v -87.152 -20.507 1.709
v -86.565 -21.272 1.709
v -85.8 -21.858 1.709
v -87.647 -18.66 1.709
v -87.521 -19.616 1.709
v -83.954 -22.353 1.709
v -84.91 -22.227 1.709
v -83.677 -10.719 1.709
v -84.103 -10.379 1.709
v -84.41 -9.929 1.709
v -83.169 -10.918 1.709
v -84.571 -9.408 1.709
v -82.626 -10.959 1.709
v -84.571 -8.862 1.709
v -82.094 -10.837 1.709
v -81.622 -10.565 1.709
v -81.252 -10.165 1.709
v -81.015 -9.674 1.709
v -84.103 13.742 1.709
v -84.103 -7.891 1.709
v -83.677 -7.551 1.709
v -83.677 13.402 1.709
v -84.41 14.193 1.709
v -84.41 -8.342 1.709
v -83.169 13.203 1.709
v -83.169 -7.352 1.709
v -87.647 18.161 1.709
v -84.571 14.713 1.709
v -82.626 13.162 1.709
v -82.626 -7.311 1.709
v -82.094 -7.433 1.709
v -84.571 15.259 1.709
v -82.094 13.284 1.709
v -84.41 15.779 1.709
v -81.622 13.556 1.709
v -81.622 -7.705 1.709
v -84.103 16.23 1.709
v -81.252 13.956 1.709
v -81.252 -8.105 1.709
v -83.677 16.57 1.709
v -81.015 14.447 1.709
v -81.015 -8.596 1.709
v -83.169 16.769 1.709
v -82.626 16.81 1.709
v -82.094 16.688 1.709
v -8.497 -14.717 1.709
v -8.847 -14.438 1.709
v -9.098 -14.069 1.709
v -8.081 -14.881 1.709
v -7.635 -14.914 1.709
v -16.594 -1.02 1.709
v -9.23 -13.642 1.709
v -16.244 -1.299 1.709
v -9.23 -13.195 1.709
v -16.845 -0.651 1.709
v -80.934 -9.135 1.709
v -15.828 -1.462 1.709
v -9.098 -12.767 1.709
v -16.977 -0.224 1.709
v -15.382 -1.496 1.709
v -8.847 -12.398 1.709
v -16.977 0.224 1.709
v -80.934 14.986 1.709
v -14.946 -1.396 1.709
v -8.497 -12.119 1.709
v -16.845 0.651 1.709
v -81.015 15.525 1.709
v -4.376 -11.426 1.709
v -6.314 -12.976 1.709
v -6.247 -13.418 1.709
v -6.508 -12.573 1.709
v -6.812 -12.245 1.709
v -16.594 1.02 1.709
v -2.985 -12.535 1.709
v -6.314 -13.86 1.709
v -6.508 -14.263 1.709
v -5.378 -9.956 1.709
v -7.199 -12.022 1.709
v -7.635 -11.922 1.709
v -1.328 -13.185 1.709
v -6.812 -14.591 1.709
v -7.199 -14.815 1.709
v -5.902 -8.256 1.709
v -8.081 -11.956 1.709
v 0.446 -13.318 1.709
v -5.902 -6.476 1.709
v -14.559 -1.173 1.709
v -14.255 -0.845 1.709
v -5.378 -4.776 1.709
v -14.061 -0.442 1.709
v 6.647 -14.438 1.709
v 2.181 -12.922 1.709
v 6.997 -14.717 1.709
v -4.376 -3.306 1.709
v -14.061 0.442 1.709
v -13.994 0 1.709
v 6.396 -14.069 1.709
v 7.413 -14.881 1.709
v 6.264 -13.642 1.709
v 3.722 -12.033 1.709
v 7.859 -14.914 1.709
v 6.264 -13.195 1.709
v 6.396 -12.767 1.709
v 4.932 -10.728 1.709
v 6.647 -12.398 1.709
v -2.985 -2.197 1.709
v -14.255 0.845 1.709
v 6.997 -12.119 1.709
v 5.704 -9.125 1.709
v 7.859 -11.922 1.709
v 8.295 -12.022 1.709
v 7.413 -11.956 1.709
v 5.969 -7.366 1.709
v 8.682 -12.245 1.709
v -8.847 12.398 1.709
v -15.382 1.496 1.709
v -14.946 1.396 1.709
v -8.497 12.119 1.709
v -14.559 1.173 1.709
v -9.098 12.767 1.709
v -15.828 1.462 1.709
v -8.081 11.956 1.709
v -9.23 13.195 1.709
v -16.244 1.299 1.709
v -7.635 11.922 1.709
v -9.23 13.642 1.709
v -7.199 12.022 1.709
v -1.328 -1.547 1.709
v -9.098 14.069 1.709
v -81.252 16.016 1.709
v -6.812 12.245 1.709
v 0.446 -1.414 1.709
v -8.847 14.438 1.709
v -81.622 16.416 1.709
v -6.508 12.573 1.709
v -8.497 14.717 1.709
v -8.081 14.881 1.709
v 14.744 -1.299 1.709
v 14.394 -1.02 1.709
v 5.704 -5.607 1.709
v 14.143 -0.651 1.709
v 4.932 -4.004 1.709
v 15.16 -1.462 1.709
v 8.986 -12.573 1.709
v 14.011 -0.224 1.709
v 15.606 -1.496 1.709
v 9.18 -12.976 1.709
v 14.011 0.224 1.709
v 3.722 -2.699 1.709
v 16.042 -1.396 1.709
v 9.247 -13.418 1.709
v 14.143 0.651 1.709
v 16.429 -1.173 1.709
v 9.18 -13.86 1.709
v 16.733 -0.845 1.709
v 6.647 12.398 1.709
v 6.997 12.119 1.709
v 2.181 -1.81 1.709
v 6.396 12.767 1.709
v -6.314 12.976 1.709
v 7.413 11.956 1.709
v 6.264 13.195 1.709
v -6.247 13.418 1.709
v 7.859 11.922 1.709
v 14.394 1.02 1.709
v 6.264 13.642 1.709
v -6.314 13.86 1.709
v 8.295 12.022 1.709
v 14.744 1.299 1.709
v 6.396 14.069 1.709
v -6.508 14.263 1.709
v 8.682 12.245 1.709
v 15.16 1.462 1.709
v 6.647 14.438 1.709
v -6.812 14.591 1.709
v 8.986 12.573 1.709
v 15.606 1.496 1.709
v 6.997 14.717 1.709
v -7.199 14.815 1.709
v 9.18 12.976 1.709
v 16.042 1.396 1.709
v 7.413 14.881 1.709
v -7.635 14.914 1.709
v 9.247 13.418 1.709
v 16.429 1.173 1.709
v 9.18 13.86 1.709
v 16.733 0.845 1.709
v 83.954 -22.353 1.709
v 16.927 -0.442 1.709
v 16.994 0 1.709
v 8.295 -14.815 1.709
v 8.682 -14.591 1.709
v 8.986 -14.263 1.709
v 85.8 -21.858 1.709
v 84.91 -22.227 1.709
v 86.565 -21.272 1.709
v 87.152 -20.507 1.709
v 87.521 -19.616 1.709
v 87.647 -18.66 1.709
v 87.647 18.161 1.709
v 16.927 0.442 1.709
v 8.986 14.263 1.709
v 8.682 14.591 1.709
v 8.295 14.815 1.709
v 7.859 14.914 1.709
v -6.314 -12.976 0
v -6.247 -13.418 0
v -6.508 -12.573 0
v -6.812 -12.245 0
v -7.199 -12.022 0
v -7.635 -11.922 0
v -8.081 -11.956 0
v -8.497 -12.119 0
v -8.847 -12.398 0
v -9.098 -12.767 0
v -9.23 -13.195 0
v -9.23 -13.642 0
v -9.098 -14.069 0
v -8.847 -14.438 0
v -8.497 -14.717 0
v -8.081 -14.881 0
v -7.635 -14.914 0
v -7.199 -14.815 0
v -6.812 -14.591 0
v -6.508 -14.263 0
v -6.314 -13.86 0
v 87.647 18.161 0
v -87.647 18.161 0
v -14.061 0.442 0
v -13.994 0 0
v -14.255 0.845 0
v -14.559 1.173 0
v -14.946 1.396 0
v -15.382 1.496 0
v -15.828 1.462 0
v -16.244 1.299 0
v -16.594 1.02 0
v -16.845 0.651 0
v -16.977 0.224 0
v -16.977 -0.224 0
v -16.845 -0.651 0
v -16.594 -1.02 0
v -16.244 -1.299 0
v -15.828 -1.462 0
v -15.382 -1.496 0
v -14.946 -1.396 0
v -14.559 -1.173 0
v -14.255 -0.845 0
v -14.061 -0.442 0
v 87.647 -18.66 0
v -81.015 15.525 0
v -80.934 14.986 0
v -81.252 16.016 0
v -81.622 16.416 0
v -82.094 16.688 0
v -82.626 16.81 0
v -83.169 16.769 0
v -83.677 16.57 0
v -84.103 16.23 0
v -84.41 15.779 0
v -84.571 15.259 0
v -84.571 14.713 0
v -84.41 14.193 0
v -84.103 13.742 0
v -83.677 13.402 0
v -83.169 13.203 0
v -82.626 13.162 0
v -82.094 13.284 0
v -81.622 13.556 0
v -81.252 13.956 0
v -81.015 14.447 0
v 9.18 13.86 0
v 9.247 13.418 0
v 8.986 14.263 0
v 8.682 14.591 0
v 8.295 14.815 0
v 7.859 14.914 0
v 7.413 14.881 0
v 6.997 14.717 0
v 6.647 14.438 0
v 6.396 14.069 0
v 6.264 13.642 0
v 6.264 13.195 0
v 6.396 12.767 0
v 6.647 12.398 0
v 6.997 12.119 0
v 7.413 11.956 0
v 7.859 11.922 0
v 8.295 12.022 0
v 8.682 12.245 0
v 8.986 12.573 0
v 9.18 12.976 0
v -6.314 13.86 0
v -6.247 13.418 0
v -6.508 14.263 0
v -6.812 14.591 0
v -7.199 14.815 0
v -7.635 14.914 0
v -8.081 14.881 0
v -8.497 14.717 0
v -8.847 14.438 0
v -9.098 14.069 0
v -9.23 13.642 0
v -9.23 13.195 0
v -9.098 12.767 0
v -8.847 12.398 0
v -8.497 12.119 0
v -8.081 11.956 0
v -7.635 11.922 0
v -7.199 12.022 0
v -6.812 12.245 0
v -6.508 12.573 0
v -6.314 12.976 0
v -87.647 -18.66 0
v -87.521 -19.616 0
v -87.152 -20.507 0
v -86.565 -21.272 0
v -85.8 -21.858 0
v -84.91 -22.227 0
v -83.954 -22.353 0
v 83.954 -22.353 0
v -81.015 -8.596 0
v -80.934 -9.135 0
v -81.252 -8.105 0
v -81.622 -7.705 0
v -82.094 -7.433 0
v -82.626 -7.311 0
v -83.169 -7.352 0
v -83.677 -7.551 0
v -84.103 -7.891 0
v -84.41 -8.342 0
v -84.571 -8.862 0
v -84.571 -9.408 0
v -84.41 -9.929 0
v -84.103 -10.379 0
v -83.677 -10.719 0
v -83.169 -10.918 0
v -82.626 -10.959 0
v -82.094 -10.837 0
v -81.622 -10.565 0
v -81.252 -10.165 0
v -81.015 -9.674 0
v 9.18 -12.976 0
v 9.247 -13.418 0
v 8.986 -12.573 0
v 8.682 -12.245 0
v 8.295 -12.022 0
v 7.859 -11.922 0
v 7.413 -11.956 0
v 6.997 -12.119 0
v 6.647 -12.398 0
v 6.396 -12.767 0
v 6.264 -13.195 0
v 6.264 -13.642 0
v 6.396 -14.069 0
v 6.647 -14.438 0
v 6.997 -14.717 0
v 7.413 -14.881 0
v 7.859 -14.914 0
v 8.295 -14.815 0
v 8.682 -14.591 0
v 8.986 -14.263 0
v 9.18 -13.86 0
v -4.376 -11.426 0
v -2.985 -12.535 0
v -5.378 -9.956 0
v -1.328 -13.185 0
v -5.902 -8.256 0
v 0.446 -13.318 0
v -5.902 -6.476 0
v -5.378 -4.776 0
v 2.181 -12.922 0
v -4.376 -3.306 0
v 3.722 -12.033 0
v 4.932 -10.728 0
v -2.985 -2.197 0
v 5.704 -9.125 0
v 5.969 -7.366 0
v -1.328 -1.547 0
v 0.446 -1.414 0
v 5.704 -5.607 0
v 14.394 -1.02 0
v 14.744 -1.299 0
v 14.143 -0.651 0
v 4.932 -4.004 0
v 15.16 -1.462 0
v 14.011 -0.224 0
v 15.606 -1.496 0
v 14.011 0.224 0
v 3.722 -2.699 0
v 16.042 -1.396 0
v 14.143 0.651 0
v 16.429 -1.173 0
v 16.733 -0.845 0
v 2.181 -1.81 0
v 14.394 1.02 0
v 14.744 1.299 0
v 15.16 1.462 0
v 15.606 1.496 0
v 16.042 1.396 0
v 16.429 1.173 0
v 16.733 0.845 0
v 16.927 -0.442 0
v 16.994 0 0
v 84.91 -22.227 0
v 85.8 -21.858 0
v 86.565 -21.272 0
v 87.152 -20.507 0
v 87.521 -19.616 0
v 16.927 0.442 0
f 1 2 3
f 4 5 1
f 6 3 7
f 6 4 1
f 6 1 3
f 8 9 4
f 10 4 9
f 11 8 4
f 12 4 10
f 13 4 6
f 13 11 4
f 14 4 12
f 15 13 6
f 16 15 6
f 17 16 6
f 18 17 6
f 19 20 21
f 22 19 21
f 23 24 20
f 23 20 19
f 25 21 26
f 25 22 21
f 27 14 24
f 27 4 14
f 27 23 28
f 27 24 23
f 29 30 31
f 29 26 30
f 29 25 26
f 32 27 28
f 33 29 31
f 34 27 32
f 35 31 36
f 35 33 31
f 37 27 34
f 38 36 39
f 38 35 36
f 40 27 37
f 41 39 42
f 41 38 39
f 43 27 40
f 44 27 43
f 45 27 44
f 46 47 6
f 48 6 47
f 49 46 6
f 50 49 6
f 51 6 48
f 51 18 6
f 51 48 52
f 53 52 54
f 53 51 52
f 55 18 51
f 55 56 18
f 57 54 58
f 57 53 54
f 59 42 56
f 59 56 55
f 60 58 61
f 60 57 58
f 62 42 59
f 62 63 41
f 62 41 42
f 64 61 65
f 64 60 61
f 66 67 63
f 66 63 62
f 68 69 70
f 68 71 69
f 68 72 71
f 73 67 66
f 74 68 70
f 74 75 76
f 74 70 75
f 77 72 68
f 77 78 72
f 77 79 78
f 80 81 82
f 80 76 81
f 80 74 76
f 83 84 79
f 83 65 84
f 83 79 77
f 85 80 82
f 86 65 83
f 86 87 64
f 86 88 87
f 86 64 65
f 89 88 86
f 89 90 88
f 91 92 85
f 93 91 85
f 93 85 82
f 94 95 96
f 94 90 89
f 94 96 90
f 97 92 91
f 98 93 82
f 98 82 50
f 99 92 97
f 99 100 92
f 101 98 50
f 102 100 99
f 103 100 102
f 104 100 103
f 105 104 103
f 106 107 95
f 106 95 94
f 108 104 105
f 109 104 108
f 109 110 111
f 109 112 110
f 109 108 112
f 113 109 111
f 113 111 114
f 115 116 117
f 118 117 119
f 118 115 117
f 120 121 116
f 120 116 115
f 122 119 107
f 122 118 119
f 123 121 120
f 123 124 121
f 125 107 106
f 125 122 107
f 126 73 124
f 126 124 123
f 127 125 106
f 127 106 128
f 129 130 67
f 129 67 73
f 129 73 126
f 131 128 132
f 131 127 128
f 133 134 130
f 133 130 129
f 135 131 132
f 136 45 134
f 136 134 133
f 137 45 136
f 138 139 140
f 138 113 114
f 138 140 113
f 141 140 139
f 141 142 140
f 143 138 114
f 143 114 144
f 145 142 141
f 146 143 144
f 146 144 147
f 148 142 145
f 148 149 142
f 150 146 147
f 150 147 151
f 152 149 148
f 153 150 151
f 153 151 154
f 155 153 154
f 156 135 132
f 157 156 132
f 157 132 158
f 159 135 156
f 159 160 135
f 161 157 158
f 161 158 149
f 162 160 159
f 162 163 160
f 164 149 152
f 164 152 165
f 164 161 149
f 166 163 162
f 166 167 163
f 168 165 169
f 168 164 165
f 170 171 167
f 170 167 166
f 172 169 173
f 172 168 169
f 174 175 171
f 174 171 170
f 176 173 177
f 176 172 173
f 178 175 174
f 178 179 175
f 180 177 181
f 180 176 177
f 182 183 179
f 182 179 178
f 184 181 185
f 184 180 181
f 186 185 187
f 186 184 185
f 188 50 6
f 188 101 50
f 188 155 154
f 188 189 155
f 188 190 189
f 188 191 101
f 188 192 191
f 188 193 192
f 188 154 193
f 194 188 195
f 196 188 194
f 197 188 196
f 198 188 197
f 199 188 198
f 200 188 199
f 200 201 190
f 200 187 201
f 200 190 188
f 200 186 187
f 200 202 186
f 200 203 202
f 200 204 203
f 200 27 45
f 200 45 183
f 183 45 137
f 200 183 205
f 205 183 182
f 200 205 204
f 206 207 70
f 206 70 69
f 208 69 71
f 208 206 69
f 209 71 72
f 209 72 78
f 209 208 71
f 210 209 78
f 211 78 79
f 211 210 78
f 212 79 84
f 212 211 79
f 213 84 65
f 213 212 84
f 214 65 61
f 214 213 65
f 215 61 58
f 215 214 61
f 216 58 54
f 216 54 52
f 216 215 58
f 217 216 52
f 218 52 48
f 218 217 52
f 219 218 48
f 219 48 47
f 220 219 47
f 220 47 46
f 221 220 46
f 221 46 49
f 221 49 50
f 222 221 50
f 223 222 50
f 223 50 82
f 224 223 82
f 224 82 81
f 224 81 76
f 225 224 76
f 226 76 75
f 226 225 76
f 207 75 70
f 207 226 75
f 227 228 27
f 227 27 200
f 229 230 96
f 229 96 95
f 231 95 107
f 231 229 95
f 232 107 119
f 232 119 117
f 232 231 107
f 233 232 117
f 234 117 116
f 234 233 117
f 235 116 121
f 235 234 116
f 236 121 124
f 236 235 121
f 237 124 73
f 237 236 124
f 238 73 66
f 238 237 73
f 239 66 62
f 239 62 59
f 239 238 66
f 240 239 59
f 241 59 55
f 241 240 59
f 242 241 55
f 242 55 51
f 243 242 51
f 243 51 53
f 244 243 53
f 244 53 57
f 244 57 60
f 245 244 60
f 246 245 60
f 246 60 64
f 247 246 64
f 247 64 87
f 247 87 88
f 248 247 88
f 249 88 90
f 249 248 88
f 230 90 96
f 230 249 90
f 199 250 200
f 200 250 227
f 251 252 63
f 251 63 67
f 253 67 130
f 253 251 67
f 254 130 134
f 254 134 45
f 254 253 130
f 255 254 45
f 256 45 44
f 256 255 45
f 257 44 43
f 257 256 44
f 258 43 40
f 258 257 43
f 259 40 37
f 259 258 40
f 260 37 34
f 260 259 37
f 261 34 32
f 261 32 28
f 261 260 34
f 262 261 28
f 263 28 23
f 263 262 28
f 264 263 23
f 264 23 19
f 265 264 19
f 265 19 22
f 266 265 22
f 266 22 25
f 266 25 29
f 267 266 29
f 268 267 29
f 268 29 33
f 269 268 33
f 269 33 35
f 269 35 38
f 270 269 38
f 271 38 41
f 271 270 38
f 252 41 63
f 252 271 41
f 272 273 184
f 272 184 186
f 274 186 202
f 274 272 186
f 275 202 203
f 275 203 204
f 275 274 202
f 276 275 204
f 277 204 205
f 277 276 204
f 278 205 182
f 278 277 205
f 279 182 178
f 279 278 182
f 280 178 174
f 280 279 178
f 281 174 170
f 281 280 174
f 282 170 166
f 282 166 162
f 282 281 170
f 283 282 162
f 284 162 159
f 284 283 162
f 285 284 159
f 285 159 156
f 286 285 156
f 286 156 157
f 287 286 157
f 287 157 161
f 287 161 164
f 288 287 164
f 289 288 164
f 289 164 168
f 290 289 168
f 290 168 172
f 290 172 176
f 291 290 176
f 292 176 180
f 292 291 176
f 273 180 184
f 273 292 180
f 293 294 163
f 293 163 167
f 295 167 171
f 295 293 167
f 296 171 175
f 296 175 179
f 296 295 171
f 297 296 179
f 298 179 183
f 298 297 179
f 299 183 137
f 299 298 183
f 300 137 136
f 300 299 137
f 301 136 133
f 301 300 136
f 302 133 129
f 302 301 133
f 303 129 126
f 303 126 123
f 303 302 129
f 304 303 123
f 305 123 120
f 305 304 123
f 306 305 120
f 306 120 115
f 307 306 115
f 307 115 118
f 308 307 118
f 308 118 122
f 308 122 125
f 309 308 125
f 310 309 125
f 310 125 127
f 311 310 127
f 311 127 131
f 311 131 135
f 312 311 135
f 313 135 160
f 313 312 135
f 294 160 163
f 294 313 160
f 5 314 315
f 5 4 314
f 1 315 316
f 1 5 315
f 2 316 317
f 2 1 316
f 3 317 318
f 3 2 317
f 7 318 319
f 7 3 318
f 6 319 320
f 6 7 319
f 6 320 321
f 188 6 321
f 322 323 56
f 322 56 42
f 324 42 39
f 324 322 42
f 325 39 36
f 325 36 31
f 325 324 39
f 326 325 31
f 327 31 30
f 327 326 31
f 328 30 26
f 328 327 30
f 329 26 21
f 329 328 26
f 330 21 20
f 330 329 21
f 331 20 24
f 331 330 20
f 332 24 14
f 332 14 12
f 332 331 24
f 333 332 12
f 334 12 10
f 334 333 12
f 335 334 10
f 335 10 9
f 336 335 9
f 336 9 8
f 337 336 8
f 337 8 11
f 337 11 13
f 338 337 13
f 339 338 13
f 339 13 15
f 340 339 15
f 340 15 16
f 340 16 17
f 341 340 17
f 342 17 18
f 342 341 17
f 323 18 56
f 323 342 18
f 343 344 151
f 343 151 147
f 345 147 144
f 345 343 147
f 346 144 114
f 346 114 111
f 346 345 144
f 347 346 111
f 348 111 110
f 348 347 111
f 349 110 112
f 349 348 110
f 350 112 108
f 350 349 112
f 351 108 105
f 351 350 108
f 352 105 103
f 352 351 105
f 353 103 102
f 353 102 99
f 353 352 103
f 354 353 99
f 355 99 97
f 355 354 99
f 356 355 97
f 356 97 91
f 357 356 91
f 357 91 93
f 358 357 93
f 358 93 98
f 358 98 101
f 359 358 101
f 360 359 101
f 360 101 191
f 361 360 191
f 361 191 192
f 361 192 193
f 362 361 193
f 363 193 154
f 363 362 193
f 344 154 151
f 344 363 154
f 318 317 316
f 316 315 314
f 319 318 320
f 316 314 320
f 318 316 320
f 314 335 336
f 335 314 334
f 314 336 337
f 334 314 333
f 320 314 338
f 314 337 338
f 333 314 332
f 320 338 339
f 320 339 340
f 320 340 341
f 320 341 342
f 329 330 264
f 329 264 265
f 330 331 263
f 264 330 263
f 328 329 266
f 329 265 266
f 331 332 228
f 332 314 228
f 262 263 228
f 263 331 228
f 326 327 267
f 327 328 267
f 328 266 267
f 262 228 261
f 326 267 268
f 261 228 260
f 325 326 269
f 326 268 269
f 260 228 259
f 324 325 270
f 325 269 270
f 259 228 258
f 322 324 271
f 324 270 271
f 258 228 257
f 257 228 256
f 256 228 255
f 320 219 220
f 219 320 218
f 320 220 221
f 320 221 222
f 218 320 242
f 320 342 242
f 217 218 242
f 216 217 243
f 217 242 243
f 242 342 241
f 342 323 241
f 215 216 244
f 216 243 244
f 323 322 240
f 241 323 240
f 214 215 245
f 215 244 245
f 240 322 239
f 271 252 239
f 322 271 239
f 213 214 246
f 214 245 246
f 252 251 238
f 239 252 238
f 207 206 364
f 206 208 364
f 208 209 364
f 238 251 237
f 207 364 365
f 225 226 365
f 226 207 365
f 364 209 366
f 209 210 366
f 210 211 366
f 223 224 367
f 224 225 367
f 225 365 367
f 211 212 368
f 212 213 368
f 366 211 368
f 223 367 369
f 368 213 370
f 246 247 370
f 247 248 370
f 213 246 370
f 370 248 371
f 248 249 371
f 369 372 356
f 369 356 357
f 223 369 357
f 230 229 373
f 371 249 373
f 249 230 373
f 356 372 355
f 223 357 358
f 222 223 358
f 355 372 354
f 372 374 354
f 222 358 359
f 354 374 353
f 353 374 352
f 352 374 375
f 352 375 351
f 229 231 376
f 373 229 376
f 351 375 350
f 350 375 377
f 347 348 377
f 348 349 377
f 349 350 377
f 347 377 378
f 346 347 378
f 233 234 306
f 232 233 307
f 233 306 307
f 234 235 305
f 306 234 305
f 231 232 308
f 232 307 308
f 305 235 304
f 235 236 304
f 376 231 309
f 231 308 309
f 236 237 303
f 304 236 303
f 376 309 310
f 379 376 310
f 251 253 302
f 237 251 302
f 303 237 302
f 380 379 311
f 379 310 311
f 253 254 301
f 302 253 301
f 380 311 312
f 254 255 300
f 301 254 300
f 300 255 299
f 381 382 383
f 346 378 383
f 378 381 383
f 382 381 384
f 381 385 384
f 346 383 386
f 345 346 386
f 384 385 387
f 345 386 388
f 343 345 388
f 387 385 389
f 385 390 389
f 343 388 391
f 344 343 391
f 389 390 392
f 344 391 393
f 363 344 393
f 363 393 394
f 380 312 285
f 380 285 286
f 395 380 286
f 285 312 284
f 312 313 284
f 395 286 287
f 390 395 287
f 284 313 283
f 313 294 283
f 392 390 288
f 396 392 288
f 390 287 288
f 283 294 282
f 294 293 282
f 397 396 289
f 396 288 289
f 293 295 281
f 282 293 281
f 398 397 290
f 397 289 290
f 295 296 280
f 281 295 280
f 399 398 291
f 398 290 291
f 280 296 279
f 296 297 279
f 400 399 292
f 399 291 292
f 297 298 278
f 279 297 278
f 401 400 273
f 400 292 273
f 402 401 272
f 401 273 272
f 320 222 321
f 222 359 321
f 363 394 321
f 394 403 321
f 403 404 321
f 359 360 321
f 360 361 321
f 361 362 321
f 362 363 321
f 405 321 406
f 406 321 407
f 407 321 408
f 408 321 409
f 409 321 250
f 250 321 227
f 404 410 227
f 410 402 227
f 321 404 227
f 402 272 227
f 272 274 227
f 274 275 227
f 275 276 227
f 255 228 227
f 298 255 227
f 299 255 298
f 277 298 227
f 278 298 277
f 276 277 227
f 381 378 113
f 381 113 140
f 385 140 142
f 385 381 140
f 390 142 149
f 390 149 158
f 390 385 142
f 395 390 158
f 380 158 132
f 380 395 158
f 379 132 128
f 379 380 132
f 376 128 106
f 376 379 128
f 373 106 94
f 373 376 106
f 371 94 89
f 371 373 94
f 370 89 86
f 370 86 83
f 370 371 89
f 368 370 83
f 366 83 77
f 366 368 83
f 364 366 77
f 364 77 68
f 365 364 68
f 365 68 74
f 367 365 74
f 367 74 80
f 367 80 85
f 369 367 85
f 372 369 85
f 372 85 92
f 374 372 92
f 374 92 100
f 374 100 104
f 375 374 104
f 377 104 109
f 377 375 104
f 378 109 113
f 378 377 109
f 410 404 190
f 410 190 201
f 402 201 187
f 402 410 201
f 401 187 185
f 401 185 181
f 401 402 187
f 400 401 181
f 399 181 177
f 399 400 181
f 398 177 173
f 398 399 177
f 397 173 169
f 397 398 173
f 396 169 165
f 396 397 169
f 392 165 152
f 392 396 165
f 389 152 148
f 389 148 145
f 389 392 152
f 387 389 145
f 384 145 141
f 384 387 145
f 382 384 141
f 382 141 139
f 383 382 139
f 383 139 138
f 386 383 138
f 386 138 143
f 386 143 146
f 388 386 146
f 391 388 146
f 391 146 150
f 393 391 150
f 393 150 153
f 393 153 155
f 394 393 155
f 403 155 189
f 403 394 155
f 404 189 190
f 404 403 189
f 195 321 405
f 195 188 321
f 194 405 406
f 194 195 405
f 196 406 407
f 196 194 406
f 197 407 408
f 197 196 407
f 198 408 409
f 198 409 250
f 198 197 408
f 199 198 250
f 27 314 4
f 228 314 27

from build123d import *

# Parameters (mm, degrees)
F0_W     = 175.293922
F0_H     = 40.514219
F0_R     = 1.5
F0_R_2   = 1.8288
F0_R_3   = 5.969
F1_DEPTH = 1.70942
F2_R     = 3.69316


with BuildPart() as f1:
    # F0 (on Top) → F1 (new body)
    with BuildSketch(Plane.XY):
        with Locations((0, -2.09611)):
            Rectangle(F0_W, F0_H)
        with Locations((-7.747, -13.418198)):
            Circle(F0_R, mode=Mode.SUBTRACT)
        with Locations((-82.762541, -9.135059)):
            Circle(F0_R_2, mode=Mode.SUBTRACT)
        with Locations((7.747, -13.418198)):
            Circle(F0_R, mode=Mode.SUBTRACT)
        with Locations((0, -7.366)):
            Circle(F0_R_3, mode=Mode.SUBTRACT)
        with Locations((-15.494, 0)):
            Circle(F0_R, mode=Mode.SUBTRACT)
        with Locations((-82.762541, 14.986)):
            Circle(F0_R_2, mode=Mode.SUBTRACT)
        with Locations((-7.747, 13.418198)):
            Circle(F0_R, mode=Mode.SUBTRACT)
        with Locations((15.494, 0)):
            Circle(F0_R, mode=Mode.SUBTRACT)
        with Locations((7.747, 13.418198)):
            Circle(F0_R, mode=Mode.SUBTRACT)
    extrude(amount=F1_DEPTH)

    # F2
    f2_edges = [f1.edges().sort_by_distance(p)[0] for p in [
        (-87.646961, -22.353219, 0.85471),
        (87.646961, -22.353219, 0.85471),
    ]]
    fillet(f2_edges, radius=F2_R)


solid = f1.part
